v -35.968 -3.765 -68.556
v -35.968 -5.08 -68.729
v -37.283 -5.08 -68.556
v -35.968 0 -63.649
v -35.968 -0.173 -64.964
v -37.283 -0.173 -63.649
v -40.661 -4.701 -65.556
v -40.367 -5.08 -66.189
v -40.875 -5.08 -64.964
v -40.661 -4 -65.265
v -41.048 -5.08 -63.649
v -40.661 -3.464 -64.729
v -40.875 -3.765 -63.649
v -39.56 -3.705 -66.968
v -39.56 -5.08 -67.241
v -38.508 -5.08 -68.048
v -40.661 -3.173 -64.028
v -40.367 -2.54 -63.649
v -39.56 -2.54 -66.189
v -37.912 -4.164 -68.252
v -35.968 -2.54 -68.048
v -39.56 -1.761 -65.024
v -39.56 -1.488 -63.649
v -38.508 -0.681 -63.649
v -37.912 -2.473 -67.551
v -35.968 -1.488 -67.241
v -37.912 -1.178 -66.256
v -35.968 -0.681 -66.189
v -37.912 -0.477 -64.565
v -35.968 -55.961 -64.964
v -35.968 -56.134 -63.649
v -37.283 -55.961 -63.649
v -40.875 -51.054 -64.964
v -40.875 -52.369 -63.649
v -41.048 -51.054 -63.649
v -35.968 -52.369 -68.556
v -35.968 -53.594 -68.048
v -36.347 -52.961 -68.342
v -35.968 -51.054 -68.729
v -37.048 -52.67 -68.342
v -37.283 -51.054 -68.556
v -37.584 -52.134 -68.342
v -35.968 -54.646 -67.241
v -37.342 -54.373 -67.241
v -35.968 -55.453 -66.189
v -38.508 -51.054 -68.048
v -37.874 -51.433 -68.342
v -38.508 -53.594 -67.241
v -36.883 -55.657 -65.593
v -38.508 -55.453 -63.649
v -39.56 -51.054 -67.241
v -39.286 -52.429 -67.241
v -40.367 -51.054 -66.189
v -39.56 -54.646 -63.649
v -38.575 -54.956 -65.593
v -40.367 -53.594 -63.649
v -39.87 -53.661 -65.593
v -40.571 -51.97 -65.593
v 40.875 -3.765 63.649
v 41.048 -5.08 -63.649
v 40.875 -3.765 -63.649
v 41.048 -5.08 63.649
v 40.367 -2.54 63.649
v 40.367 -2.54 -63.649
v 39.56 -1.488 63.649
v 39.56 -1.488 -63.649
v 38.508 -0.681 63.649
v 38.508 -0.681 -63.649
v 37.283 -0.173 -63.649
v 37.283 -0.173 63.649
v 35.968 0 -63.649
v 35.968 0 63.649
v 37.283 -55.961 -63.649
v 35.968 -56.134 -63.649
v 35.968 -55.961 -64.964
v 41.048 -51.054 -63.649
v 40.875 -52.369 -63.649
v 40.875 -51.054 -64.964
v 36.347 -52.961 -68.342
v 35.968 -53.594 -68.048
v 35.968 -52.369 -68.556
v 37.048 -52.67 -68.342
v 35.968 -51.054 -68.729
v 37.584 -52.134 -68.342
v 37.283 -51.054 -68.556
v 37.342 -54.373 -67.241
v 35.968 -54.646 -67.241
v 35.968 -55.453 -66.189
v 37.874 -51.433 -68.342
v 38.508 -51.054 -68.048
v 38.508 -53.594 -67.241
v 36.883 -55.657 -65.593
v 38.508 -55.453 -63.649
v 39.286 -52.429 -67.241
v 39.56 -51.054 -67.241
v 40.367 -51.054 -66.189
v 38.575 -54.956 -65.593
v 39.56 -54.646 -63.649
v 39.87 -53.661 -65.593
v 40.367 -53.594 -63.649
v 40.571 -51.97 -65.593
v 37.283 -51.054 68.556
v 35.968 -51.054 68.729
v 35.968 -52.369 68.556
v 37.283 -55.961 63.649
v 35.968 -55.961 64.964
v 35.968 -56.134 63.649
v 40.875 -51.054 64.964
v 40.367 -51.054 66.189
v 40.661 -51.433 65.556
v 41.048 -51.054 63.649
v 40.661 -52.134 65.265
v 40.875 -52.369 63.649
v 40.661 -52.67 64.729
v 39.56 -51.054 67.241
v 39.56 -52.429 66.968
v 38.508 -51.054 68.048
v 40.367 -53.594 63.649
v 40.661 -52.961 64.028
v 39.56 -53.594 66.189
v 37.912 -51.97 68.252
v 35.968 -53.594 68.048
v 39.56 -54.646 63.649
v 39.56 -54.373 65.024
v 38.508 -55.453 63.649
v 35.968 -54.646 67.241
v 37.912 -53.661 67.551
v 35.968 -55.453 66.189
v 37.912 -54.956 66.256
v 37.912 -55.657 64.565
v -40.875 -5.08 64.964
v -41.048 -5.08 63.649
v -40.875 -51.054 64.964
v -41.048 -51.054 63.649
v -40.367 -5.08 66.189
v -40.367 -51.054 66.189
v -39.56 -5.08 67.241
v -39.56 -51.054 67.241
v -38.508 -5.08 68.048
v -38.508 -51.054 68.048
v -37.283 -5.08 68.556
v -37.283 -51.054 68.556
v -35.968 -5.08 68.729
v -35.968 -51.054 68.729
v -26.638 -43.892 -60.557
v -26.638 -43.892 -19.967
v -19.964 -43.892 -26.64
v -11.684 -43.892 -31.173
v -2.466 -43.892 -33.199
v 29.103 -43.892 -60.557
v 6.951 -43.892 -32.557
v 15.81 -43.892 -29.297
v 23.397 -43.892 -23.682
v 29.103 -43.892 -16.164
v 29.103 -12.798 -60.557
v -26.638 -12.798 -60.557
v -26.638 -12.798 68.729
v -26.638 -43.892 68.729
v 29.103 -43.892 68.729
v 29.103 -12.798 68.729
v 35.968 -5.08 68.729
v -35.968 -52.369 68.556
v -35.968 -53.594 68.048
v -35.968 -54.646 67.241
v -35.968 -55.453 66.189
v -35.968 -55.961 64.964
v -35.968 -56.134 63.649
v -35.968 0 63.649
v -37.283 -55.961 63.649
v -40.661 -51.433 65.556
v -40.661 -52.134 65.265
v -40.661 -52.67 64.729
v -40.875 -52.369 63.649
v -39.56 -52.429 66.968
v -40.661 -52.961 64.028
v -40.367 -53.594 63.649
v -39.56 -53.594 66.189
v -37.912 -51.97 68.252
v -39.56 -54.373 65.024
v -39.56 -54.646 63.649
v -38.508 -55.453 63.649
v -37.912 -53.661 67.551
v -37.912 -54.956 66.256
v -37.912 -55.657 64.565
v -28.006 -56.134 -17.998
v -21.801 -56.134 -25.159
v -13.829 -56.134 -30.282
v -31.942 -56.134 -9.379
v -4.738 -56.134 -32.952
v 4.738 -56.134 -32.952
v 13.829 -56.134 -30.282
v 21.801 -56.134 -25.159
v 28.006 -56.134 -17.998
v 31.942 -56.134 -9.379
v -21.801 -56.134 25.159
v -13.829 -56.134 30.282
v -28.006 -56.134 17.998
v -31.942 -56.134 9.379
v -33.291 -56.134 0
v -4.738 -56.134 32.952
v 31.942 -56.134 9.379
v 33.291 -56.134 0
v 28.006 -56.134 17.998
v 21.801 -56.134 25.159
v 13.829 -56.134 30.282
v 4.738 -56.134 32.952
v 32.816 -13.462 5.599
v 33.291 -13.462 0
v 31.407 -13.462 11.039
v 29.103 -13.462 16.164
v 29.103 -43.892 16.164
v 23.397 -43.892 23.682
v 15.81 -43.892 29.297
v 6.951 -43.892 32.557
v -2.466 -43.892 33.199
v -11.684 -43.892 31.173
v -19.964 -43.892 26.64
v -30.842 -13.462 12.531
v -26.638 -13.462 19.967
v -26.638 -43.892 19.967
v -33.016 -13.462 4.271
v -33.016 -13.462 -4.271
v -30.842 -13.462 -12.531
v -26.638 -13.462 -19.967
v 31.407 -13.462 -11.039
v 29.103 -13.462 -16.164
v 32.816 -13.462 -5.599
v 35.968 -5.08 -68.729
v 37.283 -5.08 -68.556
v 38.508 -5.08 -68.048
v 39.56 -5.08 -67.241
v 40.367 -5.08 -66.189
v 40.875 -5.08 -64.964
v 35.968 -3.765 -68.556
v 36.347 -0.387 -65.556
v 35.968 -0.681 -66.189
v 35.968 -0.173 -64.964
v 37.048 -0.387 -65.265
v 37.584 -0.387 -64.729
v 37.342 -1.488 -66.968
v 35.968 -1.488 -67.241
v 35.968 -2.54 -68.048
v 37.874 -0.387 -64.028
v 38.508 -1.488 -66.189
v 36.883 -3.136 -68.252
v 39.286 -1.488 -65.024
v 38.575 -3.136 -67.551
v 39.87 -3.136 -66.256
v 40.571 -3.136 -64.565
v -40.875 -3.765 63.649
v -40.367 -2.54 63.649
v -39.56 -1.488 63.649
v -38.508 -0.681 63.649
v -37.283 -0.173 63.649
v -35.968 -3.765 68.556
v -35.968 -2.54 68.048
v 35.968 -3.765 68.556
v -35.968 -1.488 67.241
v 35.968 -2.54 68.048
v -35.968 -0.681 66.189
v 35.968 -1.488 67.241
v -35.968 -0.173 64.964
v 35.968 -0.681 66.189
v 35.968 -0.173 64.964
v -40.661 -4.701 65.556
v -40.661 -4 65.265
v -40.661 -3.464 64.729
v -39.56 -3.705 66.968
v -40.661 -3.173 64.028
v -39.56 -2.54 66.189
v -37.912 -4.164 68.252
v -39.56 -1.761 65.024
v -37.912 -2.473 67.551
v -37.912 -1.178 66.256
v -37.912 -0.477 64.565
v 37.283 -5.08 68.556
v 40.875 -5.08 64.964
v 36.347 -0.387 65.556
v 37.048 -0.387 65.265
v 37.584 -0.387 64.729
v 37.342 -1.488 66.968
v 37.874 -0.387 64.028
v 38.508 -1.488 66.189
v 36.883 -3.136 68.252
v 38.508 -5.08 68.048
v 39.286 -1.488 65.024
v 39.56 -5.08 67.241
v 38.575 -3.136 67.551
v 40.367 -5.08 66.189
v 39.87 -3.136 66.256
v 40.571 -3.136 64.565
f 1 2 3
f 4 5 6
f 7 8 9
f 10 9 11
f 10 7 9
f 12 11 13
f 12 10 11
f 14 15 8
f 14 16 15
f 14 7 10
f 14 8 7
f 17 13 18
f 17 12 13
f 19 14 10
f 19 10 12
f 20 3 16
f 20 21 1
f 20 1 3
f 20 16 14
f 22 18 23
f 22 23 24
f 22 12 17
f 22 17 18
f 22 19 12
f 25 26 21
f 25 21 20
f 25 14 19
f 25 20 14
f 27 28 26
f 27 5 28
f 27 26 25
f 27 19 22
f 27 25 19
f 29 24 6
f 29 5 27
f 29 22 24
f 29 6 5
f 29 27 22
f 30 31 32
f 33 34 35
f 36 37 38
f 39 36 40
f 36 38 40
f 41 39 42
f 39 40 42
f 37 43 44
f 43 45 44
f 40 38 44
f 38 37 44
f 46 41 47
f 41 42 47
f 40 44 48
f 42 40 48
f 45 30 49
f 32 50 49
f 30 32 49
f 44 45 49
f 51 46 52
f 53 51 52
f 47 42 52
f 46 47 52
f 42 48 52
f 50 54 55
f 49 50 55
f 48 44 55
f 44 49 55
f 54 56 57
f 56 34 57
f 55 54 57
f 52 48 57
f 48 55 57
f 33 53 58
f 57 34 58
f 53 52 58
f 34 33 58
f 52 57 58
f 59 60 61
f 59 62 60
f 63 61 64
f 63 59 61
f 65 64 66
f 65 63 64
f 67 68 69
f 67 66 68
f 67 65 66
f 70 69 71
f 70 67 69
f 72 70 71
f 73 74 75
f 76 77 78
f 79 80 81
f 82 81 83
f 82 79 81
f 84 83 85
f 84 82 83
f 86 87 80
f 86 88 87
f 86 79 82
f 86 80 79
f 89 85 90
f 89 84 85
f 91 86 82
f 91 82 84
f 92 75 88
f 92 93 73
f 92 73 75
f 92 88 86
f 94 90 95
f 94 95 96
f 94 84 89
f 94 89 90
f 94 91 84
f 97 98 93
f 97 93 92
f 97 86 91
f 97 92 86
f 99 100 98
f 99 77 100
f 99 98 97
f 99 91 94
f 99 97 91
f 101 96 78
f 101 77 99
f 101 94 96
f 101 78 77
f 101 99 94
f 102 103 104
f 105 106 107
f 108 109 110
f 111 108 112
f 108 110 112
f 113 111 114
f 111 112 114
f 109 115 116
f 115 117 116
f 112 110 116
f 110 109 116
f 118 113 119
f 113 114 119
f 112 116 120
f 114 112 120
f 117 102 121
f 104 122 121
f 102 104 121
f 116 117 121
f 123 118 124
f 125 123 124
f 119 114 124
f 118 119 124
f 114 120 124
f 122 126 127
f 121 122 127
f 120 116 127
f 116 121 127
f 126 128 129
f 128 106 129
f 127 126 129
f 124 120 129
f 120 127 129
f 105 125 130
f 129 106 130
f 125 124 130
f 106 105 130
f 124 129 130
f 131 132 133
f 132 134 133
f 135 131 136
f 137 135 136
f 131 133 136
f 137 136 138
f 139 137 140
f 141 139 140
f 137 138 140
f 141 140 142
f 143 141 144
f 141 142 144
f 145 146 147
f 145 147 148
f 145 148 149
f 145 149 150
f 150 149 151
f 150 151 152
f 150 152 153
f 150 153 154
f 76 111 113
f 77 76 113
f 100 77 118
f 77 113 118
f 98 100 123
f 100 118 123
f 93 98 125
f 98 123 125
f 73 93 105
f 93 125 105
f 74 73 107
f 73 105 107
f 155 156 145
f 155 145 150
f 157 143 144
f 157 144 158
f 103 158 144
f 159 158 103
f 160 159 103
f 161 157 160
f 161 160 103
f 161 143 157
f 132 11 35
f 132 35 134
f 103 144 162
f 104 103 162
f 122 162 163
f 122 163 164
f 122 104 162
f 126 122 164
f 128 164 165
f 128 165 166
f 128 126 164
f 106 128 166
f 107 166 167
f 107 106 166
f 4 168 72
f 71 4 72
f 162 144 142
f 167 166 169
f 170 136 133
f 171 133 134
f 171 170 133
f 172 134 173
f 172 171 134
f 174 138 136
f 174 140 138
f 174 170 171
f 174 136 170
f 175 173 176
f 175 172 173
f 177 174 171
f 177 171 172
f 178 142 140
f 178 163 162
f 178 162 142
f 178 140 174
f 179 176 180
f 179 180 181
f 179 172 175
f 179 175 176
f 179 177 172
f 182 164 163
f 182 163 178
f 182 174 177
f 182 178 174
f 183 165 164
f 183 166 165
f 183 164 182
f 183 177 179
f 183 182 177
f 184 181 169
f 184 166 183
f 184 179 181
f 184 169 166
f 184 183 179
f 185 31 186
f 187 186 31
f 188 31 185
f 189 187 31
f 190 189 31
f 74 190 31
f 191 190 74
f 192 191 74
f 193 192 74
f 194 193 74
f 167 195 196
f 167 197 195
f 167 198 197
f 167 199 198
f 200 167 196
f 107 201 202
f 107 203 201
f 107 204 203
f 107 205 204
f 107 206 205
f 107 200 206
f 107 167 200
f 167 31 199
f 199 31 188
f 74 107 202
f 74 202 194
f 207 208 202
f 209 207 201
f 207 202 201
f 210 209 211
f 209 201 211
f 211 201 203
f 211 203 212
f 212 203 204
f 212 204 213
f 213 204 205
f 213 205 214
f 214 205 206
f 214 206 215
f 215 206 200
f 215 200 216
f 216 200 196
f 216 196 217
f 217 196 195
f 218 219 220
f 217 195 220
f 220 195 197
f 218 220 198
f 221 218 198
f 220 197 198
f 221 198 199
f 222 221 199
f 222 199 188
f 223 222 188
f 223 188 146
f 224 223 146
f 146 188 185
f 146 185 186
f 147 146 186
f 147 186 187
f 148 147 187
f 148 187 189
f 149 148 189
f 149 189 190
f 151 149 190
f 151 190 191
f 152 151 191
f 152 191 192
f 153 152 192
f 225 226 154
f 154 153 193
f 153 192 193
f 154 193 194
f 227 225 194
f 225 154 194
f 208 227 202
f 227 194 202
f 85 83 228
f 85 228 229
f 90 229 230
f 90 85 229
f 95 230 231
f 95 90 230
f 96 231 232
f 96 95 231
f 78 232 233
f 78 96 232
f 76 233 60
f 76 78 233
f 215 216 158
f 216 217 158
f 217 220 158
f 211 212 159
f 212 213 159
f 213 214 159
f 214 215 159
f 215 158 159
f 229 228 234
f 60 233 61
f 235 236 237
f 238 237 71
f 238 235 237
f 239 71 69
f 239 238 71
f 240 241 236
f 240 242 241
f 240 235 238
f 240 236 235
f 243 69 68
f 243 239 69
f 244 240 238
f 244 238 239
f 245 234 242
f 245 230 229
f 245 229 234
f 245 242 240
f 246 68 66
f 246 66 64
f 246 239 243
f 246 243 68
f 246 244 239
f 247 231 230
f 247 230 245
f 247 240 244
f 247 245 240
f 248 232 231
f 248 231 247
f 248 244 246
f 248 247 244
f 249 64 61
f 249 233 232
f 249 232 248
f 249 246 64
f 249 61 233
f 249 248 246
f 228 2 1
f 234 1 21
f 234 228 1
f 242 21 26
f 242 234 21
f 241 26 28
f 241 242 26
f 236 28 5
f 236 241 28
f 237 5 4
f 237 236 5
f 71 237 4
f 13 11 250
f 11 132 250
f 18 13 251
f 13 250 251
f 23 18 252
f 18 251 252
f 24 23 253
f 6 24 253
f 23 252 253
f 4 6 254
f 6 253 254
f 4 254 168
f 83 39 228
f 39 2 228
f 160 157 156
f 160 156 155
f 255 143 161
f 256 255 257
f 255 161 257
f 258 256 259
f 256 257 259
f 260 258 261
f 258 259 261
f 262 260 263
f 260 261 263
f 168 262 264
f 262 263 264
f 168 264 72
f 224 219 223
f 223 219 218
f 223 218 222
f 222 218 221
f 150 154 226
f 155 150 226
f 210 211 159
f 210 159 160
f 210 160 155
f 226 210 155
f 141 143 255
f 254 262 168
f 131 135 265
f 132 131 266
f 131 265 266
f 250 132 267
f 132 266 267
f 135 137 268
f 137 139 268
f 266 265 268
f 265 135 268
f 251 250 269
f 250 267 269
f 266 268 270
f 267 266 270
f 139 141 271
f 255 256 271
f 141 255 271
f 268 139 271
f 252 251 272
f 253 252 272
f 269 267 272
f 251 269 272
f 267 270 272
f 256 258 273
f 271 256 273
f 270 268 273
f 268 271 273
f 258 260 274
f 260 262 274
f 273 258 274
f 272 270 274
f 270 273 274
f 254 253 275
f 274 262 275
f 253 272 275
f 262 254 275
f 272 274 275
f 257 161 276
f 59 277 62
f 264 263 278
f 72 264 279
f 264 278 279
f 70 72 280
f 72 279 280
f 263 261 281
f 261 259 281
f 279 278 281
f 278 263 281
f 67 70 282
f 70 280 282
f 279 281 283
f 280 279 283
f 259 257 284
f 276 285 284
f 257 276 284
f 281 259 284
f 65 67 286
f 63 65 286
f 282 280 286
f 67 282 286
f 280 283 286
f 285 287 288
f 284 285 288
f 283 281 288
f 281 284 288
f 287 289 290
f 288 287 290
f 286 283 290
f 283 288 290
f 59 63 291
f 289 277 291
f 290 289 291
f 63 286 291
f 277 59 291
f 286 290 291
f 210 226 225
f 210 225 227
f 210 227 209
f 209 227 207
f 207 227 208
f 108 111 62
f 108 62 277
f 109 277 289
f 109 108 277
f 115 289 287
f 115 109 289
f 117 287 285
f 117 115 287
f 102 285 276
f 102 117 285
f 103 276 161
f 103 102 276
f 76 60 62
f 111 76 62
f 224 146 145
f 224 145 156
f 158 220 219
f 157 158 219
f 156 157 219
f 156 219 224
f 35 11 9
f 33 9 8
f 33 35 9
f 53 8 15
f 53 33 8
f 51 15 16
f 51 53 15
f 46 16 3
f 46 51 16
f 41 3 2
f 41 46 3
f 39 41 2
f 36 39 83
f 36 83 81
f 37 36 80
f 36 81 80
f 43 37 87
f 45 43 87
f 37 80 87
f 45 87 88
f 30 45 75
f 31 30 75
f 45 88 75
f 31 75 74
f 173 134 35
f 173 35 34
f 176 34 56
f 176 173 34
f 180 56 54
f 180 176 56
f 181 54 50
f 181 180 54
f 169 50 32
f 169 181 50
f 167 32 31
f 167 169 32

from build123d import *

# Parameters (mm, degrees)
F0_W     = 82.09557
F0_H     = 137.457938
F1_DEPTH = 56.134
F2_R     = 5.08
F3_W     = 55.741566
F3_H     = 31.093935
F5_DEPTH = 129.286
F4_R     = 33.290636
F6_DEPTH = 42.672


with BuildPart() as f1:
    # F0 (on Front) → F1 (new body)
    with BuildSketch(Plane.XZ):
        Rectangle(F0_W, F0_H)
    extrude(amount=F1_DEPTH)

    # F2
    f2_edges = [f1.edges().sort_by_distance(p)[0] for p in [
        (0, -56.134, 68.728969),
        (41.047785, -28.067, 68.728969),
        (0, 0, 68.728969),
        (-41.047785, -28.067, 68.728969),
        (41.047785, -56.134, 0),
        (-41.047785, -56.134, 0),
        (0, -56.134, -68.728969),
        (41.047785, -28.067, -68.728969),
        (0, 0, -68.728969),
        (-41.047785, -28.067, -68.728969),
        (41.047785, 0, 0),
        (-41.047785, 0, 0),
    ]]
    fillet(f2_edges, radius=F2_R)

    # F3 (on face) → F5 (cut)
    with BuildSketch(Plane.XY.offset(68.728969)):
        with Locations((1.232381, -28.344775)):
            Rectangle(F3_W, F3_H)
    extrude(amount=-F5_DEPTH, mode=Mode.SUBTRACT)

    # F4 (on face) → F6 (cut)
    with BuildSketch(Plane.XZ.offset(56.134)):
        Circle(F4_R)
    extrude(amount=-F6_DEPTH, mode=Mode.SUBTRACT)


solid = f1.part
